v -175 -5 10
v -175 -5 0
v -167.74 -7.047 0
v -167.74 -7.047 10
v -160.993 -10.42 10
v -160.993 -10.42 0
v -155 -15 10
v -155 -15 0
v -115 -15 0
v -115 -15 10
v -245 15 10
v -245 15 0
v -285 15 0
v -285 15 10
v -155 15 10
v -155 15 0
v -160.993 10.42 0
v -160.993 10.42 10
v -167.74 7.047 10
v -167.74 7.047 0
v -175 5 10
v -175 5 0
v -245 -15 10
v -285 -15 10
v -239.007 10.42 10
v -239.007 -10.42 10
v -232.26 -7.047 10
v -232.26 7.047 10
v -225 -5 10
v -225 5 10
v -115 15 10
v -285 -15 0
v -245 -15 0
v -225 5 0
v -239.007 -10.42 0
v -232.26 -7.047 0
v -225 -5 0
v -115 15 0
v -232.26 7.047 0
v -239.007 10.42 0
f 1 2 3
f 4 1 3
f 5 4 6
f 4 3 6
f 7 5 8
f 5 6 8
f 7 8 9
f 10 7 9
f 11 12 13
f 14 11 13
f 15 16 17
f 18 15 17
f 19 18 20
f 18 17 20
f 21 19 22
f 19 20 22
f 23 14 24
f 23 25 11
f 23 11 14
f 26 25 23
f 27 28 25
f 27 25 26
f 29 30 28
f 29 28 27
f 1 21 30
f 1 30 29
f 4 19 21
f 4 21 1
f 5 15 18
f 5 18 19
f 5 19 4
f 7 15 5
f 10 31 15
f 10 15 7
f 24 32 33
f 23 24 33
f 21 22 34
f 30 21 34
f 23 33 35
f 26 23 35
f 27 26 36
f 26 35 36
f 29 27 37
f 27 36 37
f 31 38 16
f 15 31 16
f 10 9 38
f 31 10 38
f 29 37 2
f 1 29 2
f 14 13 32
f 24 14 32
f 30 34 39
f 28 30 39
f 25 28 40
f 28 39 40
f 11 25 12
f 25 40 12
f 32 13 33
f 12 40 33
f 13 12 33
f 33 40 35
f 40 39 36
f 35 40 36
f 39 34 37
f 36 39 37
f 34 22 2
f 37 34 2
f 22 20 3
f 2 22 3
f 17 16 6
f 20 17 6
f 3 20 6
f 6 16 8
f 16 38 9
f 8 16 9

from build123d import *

# Parameters (mm, degrees)
F1_DEPTH = 10
F2_ANGLE = 90


with BuildPart() as f1:
    # F0 (on Top) → F1 (new body)
    with BuildSketch(Plane.XY):
        with BuildLine():
            Line((-15, -85), (15, -85))
            Line((15, -85), (15, -45))
            ThreePointArc((15, -45), (8.5740404346, -35.7129797827), (5, -25))
            Line((5, -25), (5, 25))
            ThreePointArc((5, 25), (8.5740404346, 35.7129797827), (15, 45))
            Line((15, 45), (15, 85))
            Line((15, 85), (-15, 85))
            Line((-15, 85), (-15, 45))
            ThreePointArc((-15, 45), (-8.5740404346, 35.7129797827), (-5, 25))
            Line((-5, 25), (-5, -25))
            ThreePointArc((-5, -25), (-8.5740404346, -35.7129797827), (-15, -45))
            Line((-15, -45), (-15, -85))
        make_face()
    extrude(amount=F1_DEPTH)


with BuildPart() as f1_1:
    # F2: moved
    add(f1.part.rotate(Axis((-15, -85, 5), (0, 0, -1)), F2_ANGLE))


with BuildPart() as f1_2:
    # F3: moved
    add(f1_1.part.moved(Location((-70, 100, 0))))


with BuildPart() as f1_3:
    # F4: moved
    add(f1_2.part.moved(Location((-200, 0, 0))))


solid = f1_3.part
